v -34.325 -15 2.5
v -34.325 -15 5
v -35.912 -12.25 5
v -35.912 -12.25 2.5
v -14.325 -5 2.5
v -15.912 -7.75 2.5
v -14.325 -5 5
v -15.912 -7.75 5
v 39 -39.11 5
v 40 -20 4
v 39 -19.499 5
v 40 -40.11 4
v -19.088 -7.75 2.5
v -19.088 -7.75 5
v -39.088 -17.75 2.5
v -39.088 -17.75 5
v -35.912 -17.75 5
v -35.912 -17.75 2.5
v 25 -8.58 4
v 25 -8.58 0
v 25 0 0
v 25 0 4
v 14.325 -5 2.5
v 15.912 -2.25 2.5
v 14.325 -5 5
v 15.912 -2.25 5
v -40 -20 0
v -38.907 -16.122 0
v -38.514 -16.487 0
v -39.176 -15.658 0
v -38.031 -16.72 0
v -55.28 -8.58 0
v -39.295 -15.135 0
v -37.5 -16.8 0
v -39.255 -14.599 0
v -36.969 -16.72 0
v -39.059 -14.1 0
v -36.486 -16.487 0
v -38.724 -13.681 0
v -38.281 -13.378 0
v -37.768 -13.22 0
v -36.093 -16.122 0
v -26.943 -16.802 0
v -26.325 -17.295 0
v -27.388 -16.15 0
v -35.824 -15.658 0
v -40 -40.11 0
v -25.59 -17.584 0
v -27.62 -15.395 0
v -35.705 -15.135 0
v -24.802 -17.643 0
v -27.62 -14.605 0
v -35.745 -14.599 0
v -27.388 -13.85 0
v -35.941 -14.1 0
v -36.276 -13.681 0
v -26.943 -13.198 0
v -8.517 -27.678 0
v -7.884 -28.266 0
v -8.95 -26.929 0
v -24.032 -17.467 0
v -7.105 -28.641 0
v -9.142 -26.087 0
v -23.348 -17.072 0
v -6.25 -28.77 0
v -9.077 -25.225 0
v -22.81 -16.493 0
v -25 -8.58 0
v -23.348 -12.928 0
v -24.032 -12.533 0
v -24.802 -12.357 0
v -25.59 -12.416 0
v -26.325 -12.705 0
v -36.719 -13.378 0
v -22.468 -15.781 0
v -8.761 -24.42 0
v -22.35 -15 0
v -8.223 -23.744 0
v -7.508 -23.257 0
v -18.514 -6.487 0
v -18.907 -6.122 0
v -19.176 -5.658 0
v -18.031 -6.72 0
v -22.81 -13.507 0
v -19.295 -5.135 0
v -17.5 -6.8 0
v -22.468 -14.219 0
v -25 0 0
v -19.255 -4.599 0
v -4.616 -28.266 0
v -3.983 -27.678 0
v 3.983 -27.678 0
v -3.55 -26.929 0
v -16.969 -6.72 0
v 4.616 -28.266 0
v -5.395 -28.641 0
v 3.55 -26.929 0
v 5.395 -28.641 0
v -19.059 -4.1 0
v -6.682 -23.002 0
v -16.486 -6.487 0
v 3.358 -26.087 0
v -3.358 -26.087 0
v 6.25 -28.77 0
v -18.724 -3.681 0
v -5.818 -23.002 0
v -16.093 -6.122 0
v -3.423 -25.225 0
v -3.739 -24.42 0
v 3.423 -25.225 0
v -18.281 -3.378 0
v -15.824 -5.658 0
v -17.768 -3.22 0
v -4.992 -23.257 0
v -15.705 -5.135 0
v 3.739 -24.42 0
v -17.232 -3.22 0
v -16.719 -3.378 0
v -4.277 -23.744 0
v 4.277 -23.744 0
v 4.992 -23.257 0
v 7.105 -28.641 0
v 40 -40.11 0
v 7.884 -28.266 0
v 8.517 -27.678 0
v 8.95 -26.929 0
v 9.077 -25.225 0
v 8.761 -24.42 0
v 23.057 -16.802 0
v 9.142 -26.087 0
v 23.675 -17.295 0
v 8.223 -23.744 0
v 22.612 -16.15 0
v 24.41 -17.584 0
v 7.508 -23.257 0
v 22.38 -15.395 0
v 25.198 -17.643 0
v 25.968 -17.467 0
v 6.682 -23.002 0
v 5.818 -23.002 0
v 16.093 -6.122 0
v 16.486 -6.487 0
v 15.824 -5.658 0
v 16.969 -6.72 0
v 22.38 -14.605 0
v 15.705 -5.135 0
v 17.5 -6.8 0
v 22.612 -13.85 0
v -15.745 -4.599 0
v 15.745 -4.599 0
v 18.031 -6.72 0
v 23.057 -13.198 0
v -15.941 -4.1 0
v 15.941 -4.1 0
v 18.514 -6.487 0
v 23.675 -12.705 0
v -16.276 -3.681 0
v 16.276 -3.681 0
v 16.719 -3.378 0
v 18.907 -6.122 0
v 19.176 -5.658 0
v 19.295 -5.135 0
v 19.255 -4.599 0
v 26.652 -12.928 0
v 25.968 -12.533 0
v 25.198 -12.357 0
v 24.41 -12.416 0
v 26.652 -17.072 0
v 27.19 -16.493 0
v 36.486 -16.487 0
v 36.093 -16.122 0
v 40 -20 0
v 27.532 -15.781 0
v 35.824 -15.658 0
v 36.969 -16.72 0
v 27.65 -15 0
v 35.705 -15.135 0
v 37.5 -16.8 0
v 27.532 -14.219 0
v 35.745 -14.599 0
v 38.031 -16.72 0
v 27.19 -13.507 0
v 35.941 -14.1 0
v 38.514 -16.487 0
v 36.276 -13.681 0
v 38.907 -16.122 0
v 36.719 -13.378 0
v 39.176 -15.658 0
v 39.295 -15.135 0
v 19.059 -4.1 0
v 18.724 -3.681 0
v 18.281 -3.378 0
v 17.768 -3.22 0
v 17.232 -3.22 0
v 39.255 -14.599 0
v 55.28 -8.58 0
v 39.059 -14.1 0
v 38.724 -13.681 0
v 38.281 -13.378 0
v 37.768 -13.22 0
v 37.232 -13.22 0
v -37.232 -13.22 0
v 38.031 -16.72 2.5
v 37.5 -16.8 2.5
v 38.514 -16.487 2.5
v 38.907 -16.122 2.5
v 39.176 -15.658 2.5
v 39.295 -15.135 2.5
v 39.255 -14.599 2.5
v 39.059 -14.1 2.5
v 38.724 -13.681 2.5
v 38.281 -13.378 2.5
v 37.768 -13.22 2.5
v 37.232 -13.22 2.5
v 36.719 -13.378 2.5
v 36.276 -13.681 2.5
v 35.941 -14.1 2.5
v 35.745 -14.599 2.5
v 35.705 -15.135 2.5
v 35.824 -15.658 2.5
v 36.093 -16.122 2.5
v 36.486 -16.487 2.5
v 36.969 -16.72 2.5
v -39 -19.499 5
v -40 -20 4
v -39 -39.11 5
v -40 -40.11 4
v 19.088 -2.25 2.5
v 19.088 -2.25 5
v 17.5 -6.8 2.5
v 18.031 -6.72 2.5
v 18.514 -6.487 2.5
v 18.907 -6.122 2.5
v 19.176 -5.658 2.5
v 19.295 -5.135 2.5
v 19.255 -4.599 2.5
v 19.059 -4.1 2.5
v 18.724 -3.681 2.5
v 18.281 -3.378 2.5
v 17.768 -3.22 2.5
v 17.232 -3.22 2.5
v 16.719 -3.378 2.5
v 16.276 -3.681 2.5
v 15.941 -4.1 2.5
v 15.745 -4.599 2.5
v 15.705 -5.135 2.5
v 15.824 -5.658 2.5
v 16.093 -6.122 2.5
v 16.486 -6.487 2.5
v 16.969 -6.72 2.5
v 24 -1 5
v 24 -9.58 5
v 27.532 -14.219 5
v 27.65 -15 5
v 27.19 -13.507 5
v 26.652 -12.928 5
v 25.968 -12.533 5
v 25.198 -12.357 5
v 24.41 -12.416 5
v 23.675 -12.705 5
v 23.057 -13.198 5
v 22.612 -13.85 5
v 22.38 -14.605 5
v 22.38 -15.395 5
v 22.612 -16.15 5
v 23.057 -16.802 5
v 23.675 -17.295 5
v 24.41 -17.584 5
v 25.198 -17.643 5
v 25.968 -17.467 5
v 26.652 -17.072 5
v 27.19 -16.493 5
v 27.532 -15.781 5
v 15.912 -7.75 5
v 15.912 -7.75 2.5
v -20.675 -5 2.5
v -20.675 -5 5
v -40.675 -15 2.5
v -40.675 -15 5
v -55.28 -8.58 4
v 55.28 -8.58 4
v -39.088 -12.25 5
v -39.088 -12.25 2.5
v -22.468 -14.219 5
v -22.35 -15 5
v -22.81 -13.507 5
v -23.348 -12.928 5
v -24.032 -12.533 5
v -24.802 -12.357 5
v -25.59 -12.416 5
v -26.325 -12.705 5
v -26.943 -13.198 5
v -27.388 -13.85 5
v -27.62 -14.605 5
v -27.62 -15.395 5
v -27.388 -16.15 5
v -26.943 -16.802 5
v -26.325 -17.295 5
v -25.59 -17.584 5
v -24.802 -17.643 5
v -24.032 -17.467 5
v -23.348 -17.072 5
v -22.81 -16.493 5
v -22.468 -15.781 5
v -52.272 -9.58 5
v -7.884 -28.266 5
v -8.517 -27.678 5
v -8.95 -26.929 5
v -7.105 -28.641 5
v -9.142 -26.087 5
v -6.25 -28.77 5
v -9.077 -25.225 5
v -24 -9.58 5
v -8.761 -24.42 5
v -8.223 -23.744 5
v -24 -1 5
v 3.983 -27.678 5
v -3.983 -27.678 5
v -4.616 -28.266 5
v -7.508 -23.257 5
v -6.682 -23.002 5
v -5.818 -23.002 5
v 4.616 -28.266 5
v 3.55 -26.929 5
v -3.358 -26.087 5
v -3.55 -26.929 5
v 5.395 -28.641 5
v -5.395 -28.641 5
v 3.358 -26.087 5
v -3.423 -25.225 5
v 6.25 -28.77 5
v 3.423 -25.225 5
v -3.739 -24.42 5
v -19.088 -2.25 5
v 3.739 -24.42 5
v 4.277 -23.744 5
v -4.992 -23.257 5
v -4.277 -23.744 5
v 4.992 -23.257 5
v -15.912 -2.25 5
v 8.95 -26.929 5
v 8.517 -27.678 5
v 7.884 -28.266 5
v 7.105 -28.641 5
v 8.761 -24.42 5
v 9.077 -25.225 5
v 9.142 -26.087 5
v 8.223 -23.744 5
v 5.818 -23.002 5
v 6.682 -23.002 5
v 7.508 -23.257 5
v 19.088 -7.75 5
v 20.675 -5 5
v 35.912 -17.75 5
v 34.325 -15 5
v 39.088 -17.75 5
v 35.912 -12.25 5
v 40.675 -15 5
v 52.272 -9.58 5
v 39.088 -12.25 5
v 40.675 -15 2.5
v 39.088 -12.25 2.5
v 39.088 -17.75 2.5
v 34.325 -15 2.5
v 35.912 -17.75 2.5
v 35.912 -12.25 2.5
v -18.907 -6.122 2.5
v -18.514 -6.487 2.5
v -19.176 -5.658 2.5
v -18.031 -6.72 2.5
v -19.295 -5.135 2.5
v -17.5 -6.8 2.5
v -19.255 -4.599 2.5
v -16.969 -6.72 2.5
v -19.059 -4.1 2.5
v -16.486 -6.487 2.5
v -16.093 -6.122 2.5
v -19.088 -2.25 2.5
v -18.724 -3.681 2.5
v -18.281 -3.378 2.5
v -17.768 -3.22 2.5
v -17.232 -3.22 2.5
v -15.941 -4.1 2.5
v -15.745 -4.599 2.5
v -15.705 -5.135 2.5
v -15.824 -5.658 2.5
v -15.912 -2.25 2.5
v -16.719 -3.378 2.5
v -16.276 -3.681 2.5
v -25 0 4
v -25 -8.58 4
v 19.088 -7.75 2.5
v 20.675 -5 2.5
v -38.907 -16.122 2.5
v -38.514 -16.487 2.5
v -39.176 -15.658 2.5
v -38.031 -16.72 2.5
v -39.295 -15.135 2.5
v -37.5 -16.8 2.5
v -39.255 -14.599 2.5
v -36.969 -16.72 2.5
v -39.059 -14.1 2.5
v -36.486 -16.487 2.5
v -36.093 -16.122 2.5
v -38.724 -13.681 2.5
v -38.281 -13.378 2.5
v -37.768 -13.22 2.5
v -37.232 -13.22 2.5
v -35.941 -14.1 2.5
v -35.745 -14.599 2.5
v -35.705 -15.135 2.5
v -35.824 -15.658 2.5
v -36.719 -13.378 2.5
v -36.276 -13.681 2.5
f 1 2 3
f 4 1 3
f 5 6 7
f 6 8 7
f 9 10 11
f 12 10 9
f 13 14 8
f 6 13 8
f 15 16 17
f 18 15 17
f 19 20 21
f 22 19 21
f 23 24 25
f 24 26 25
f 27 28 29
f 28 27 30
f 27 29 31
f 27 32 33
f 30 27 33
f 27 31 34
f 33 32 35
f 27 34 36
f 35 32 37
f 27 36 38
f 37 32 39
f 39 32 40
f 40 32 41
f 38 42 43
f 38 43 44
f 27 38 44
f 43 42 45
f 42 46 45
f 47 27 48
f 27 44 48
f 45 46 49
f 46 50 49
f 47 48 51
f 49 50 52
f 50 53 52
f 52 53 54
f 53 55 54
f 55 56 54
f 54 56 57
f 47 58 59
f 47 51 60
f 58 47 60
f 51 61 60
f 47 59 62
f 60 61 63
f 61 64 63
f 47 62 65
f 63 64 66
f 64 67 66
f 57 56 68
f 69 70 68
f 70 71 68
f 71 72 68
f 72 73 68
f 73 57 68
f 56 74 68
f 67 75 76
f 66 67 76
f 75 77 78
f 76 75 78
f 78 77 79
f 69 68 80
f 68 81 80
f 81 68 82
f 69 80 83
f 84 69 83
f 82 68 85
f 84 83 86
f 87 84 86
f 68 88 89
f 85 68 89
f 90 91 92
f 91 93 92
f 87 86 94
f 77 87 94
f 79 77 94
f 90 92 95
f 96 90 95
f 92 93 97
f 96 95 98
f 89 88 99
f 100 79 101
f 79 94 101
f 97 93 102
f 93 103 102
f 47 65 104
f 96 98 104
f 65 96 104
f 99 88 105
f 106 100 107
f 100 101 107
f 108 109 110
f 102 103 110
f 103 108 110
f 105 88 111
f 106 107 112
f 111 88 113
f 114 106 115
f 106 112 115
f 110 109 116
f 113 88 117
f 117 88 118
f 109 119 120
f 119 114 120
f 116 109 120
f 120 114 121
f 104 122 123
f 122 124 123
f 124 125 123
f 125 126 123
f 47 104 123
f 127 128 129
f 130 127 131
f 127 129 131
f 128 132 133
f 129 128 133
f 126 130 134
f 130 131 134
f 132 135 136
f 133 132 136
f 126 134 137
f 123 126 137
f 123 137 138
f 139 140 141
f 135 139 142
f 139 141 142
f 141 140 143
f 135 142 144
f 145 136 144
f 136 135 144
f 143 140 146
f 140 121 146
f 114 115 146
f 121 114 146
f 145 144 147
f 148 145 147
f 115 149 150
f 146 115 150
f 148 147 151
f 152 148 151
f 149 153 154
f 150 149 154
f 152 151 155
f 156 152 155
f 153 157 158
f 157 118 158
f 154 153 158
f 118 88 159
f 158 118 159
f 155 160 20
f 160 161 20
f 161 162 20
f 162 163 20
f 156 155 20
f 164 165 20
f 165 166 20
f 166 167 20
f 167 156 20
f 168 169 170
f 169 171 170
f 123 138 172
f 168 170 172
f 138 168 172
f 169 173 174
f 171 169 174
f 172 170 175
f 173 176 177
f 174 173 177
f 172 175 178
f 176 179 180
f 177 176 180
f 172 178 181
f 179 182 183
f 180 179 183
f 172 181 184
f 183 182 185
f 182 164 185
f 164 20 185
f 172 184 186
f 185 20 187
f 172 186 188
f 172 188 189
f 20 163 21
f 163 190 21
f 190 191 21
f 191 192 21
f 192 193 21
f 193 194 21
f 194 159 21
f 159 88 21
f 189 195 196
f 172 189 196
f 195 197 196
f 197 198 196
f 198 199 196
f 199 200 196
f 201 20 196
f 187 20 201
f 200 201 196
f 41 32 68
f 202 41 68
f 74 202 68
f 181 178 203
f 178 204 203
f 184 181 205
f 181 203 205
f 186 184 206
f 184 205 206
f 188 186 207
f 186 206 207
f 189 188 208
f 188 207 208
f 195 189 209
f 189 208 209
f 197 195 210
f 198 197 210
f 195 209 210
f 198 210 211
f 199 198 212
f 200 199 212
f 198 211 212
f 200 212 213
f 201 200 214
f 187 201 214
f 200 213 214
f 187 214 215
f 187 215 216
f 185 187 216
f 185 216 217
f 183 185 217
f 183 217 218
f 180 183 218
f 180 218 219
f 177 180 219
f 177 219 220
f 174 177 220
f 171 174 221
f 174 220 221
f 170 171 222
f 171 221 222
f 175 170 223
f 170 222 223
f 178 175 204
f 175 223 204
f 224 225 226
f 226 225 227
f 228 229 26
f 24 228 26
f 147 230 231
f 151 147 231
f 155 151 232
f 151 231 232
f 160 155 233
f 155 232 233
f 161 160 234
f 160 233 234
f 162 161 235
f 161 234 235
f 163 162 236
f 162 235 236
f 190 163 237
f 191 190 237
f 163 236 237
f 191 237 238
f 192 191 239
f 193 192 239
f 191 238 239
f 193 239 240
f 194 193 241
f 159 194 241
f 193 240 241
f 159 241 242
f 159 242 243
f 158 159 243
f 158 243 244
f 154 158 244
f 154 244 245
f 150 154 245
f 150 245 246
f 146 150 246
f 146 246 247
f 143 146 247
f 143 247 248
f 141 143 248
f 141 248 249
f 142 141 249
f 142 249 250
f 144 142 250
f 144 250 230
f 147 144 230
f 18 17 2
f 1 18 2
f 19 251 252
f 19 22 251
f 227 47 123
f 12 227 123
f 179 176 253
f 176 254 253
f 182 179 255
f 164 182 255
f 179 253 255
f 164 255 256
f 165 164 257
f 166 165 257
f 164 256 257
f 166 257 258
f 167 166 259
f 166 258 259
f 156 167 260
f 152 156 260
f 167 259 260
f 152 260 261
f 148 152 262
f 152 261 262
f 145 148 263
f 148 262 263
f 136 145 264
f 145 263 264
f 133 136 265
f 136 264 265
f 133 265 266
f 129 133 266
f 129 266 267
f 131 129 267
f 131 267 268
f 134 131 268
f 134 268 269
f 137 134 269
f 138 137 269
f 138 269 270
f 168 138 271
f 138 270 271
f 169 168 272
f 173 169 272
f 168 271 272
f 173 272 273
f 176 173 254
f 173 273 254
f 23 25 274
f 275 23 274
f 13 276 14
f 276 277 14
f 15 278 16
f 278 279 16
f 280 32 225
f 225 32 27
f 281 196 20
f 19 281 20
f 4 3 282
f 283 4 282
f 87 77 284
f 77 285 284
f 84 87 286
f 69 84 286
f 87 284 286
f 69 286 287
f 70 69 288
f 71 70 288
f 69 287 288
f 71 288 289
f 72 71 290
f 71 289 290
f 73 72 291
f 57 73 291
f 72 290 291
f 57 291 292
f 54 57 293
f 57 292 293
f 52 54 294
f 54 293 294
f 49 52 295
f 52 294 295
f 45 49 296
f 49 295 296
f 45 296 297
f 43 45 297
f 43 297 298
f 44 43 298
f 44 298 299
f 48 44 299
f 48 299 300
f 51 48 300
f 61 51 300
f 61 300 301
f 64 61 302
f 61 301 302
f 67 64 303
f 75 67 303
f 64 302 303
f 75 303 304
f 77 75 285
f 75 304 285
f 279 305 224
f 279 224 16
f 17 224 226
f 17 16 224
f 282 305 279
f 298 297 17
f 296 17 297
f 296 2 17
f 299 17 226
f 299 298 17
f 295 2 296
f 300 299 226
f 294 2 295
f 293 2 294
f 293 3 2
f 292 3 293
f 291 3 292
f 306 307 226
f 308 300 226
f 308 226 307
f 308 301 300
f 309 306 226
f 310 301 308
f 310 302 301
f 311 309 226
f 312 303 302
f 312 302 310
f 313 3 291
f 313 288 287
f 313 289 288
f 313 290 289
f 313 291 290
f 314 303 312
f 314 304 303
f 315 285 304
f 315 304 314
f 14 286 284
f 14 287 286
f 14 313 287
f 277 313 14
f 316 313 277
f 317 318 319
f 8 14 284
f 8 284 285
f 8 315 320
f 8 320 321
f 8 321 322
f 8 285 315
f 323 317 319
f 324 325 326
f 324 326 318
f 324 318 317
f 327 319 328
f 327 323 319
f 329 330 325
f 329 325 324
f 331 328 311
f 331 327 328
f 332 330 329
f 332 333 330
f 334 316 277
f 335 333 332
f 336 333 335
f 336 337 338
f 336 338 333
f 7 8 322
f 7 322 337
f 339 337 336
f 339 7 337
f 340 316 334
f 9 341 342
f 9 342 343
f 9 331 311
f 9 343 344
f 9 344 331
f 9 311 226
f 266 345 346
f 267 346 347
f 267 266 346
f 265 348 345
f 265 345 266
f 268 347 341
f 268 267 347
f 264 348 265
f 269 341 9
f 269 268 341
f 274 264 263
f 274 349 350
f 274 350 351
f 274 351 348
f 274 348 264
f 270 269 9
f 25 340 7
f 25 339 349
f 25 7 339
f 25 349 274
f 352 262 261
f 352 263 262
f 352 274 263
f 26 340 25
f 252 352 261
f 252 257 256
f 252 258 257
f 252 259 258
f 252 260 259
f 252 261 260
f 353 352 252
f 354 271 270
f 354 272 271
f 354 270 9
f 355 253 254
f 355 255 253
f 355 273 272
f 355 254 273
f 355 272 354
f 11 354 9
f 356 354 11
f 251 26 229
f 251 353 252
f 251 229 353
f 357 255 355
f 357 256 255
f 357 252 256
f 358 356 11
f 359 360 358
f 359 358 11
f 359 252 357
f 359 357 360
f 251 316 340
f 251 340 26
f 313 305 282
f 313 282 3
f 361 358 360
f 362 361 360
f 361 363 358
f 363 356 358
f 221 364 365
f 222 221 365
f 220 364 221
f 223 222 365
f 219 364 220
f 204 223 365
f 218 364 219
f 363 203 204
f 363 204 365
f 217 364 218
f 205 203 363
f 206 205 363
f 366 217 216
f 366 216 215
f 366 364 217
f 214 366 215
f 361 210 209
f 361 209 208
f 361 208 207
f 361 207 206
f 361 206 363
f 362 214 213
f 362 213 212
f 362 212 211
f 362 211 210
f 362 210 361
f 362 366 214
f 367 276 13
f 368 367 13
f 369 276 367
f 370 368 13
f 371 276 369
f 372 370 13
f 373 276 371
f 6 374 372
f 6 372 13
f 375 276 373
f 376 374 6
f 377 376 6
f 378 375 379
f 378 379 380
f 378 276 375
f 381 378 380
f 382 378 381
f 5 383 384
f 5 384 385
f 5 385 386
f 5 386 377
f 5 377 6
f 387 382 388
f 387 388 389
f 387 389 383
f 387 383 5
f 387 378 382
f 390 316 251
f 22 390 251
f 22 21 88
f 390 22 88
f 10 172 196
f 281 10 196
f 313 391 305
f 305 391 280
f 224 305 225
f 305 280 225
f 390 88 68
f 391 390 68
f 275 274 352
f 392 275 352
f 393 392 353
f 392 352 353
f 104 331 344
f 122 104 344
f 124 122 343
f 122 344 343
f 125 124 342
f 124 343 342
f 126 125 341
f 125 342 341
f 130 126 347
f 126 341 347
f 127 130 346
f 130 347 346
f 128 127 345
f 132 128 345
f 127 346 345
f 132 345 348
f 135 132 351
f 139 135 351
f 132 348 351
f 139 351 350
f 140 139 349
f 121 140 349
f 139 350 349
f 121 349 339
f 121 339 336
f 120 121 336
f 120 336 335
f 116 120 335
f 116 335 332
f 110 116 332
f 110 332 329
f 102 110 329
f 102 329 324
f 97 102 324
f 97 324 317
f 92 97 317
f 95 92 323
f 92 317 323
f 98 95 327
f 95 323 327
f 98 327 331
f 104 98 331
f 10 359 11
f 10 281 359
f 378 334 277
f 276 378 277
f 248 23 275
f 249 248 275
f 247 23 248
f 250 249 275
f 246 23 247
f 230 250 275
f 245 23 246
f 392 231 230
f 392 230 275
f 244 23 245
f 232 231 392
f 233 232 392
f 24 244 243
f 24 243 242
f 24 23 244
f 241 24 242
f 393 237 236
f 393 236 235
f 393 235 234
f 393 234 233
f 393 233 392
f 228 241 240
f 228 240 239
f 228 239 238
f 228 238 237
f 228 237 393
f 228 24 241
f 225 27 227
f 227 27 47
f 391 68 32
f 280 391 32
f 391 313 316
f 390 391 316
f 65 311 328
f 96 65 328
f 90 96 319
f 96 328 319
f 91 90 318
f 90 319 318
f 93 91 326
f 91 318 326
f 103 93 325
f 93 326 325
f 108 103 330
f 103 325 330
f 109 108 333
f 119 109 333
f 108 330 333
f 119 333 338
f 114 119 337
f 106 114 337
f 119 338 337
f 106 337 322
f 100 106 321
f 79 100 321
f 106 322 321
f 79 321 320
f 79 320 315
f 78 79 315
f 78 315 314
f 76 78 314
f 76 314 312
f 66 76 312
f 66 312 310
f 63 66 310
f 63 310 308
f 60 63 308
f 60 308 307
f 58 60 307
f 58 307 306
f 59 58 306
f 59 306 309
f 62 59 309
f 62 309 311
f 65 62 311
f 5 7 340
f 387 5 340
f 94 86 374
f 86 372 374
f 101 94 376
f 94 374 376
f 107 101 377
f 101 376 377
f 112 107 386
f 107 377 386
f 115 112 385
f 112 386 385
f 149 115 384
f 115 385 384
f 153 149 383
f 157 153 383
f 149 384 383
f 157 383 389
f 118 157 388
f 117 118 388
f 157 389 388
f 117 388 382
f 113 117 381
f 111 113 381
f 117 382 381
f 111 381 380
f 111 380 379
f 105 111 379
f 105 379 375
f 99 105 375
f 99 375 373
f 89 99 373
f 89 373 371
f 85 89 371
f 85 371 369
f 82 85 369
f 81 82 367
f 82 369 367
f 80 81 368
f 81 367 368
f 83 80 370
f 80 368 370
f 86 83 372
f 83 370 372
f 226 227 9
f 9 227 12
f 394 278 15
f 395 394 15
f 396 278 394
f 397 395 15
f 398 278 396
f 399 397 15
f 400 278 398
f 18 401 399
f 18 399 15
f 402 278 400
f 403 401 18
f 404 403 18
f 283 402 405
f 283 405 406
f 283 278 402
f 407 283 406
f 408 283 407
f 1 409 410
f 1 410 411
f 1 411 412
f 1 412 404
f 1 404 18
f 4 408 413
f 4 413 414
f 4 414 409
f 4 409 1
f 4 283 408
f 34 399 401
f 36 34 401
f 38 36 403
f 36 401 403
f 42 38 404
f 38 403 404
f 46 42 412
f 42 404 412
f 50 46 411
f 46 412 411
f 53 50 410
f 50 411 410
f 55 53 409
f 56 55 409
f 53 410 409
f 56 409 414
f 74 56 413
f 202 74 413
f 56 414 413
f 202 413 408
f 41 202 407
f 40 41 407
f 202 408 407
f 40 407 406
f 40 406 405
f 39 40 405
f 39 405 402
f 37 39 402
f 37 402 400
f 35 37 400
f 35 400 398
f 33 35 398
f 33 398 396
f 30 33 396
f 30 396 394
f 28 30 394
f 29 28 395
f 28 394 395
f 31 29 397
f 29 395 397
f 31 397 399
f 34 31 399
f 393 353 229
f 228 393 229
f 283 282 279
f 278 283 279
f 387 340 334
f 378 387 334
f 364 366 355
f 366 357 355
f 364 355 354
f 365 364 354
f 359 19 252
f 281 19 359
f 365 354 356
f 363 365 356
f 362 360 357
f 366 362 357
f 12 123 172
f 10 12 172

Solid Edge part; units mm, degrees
sketch "Sketch1" plane through (0, 0, 0) normal (0, 0, 1) x (1, 0, 0)
  line L0 (0, 0) -> (-25, 0)
  line L1 (-25, 0) -> (-25, -8.58)
  line L2 (-25, -8.58) -> (-55.28, -8.58)
  line L3 (-55.28, -8.58) -> (-40, -20)
  line L4 (-40, -20) -> (-40, -40.11)
  line L5 (-40, -40.11) -> (0, -40.11)
  line L6 (0, -40.11) -> (0, 0)
  dimension "D1" = 25
  dimension "D2" = 40
  dimension "D3" = 30.28
  dimension "D4" = 8.58
  dimension "D5" = 40.11
  dimension "D6" = 11.42
extrude "Protrusion1" add sketch "Sketch1" along normal blind 5
mirror "Mirror1" about plane through (0, 0, 0) normal (1, 0, 0) of "Protrusion1"
chamfer "Fase_1" distance 1 angle 45 10 edges at (-40.14, -8.58, 5) (-25, -4.29, 5) (0, 0, 5) (25, -4.29, 5) (40.14, -8.58, 5) (47.64, -14.29, 5) (40, -30.055, 5) (0, -40.11, 5) (-40, -30.055, 5) (-47.64, -14.29, 5)
sketch "Sketch2" plane through (0, -20.055, 5) normal (0, 0, 1) x (1, 0, 0)
  circle A0 centre (-25, 5.055) radius 2.65
  circle A1 centre (25, 5.055) radius 2.65
  dimension "D1" = 50
  dimension "D2" = 5.3
  dimension "D3" = 5.3
  dimension "D4" = 15
  dimension "D5" = 25
extrude "Extrusionsausschnitt_1" cut sketch "Sketch2" against normal blind 40
sketch "Sketch3" plane through (0, -20.055, 5) normal (0, 0, 1) x (1, 0, 0)
  line L0 (-15.9123, 17.805) -> (-19.0877, 17.805)
  line L1 (-19.0877, 17.805) -> (-20.6754, 15.055)
  line L2 (-20.6754, 15.055) -> (-19.0877, 12.305)
  line L3 (-19.0877, 12.305) -> (-15.9123, 12.305)
  line L4 (-15.9123, 12.305) -> (-14.3246, 15.055)
  line L5 (-14.3246, 15.055) -> (-15.9123, 17.805)
  line L6 (19.0877, 17.805) -> (15.9123, 17.805)
  line L7 (15.9123, 17.805) -> (14.3246, 15.055)
  line L8 (14.3246, 15.055) -> (15.9123, 12.305)
  line L9 (15.9123, 12.305) -> (19.0877, 12.305)
  line L10 (19.0877, 12.305) -> (20.6754, 15.055)
  line L11 (20.6754, 15.055) -> (19.0877, 17.805)
  line L12 (39.0877, 7.805) -> (35.9123, 7.805)
  line L13 (35.9123, 7.805) -> (34.3246, 5.055)
  line L14 (34.3246, 5.055) -> (35.9123, 2.305)
  line L15 (35.9123, 2.305) -> (39.0877, 2.305)
  line L16 (39.0877, 2.305) -> (40.6754, 5.055)
  line L17 (40.6754, 5.055) -> (39.0877, 7.805)
  line L18 (-35.9123, 7.805) -> (-39.0877, 7.805)
  line L19 (-39.0877, 7.805) -> (-40.6754, 5.055)
  line L20 (-40.6754, 5.055) -> (-39.0877, 2.305)
  line L21 (-39.0877, 2.305) -> (-35.9123, 2.305)
  line L22 (-35.9123, 2.305) -> (-34.3246, 5.055)
  line L23 (-34.3246, 5.055) -> (-35.9123, 7.805)
  dimension "D1" = 5.5
  dimension "D2" = 35
  dimension "D3" = 17.5
  dimension "D4" = 10
  dimension "D5" = 5.5
  dimension "D6" = 75
  dimension "D7" = 37.5
  dimension "D8" = 5.5
  dimension "D9" = 5.5
extrude "Extrusionsausschnitt_2" cut sketch "Sketch3" against normal blind 2.5
hole "Bohrung_1" at (-37.5, -15, 2.5) direction (0, 0, -1) diameter 3.6 end up to next
hole "Hole1" at (-17.5, -5, 2.5) direction (0, 0, -1) diameter 3.6 end up to next
hole "Hole2" at (17.5, -5, 2.5) direction (0, 0, -1) diameter 3.6 end up to next
hole "Hole3" at (37.5, -15, 2.5) direction (0, 0, -1) diameter 3.6 end up to next
hole "Bohrung_5" at (-6.25, -25.87, 5) direction (0, 0, -1) diameter 5.8 end up to next
hole "Hole4" at (6.25, -25.87, 5) direction (0, 0, -1) diameter 5.8 end up to next
properties part number "50" material "Polyacticacid"
